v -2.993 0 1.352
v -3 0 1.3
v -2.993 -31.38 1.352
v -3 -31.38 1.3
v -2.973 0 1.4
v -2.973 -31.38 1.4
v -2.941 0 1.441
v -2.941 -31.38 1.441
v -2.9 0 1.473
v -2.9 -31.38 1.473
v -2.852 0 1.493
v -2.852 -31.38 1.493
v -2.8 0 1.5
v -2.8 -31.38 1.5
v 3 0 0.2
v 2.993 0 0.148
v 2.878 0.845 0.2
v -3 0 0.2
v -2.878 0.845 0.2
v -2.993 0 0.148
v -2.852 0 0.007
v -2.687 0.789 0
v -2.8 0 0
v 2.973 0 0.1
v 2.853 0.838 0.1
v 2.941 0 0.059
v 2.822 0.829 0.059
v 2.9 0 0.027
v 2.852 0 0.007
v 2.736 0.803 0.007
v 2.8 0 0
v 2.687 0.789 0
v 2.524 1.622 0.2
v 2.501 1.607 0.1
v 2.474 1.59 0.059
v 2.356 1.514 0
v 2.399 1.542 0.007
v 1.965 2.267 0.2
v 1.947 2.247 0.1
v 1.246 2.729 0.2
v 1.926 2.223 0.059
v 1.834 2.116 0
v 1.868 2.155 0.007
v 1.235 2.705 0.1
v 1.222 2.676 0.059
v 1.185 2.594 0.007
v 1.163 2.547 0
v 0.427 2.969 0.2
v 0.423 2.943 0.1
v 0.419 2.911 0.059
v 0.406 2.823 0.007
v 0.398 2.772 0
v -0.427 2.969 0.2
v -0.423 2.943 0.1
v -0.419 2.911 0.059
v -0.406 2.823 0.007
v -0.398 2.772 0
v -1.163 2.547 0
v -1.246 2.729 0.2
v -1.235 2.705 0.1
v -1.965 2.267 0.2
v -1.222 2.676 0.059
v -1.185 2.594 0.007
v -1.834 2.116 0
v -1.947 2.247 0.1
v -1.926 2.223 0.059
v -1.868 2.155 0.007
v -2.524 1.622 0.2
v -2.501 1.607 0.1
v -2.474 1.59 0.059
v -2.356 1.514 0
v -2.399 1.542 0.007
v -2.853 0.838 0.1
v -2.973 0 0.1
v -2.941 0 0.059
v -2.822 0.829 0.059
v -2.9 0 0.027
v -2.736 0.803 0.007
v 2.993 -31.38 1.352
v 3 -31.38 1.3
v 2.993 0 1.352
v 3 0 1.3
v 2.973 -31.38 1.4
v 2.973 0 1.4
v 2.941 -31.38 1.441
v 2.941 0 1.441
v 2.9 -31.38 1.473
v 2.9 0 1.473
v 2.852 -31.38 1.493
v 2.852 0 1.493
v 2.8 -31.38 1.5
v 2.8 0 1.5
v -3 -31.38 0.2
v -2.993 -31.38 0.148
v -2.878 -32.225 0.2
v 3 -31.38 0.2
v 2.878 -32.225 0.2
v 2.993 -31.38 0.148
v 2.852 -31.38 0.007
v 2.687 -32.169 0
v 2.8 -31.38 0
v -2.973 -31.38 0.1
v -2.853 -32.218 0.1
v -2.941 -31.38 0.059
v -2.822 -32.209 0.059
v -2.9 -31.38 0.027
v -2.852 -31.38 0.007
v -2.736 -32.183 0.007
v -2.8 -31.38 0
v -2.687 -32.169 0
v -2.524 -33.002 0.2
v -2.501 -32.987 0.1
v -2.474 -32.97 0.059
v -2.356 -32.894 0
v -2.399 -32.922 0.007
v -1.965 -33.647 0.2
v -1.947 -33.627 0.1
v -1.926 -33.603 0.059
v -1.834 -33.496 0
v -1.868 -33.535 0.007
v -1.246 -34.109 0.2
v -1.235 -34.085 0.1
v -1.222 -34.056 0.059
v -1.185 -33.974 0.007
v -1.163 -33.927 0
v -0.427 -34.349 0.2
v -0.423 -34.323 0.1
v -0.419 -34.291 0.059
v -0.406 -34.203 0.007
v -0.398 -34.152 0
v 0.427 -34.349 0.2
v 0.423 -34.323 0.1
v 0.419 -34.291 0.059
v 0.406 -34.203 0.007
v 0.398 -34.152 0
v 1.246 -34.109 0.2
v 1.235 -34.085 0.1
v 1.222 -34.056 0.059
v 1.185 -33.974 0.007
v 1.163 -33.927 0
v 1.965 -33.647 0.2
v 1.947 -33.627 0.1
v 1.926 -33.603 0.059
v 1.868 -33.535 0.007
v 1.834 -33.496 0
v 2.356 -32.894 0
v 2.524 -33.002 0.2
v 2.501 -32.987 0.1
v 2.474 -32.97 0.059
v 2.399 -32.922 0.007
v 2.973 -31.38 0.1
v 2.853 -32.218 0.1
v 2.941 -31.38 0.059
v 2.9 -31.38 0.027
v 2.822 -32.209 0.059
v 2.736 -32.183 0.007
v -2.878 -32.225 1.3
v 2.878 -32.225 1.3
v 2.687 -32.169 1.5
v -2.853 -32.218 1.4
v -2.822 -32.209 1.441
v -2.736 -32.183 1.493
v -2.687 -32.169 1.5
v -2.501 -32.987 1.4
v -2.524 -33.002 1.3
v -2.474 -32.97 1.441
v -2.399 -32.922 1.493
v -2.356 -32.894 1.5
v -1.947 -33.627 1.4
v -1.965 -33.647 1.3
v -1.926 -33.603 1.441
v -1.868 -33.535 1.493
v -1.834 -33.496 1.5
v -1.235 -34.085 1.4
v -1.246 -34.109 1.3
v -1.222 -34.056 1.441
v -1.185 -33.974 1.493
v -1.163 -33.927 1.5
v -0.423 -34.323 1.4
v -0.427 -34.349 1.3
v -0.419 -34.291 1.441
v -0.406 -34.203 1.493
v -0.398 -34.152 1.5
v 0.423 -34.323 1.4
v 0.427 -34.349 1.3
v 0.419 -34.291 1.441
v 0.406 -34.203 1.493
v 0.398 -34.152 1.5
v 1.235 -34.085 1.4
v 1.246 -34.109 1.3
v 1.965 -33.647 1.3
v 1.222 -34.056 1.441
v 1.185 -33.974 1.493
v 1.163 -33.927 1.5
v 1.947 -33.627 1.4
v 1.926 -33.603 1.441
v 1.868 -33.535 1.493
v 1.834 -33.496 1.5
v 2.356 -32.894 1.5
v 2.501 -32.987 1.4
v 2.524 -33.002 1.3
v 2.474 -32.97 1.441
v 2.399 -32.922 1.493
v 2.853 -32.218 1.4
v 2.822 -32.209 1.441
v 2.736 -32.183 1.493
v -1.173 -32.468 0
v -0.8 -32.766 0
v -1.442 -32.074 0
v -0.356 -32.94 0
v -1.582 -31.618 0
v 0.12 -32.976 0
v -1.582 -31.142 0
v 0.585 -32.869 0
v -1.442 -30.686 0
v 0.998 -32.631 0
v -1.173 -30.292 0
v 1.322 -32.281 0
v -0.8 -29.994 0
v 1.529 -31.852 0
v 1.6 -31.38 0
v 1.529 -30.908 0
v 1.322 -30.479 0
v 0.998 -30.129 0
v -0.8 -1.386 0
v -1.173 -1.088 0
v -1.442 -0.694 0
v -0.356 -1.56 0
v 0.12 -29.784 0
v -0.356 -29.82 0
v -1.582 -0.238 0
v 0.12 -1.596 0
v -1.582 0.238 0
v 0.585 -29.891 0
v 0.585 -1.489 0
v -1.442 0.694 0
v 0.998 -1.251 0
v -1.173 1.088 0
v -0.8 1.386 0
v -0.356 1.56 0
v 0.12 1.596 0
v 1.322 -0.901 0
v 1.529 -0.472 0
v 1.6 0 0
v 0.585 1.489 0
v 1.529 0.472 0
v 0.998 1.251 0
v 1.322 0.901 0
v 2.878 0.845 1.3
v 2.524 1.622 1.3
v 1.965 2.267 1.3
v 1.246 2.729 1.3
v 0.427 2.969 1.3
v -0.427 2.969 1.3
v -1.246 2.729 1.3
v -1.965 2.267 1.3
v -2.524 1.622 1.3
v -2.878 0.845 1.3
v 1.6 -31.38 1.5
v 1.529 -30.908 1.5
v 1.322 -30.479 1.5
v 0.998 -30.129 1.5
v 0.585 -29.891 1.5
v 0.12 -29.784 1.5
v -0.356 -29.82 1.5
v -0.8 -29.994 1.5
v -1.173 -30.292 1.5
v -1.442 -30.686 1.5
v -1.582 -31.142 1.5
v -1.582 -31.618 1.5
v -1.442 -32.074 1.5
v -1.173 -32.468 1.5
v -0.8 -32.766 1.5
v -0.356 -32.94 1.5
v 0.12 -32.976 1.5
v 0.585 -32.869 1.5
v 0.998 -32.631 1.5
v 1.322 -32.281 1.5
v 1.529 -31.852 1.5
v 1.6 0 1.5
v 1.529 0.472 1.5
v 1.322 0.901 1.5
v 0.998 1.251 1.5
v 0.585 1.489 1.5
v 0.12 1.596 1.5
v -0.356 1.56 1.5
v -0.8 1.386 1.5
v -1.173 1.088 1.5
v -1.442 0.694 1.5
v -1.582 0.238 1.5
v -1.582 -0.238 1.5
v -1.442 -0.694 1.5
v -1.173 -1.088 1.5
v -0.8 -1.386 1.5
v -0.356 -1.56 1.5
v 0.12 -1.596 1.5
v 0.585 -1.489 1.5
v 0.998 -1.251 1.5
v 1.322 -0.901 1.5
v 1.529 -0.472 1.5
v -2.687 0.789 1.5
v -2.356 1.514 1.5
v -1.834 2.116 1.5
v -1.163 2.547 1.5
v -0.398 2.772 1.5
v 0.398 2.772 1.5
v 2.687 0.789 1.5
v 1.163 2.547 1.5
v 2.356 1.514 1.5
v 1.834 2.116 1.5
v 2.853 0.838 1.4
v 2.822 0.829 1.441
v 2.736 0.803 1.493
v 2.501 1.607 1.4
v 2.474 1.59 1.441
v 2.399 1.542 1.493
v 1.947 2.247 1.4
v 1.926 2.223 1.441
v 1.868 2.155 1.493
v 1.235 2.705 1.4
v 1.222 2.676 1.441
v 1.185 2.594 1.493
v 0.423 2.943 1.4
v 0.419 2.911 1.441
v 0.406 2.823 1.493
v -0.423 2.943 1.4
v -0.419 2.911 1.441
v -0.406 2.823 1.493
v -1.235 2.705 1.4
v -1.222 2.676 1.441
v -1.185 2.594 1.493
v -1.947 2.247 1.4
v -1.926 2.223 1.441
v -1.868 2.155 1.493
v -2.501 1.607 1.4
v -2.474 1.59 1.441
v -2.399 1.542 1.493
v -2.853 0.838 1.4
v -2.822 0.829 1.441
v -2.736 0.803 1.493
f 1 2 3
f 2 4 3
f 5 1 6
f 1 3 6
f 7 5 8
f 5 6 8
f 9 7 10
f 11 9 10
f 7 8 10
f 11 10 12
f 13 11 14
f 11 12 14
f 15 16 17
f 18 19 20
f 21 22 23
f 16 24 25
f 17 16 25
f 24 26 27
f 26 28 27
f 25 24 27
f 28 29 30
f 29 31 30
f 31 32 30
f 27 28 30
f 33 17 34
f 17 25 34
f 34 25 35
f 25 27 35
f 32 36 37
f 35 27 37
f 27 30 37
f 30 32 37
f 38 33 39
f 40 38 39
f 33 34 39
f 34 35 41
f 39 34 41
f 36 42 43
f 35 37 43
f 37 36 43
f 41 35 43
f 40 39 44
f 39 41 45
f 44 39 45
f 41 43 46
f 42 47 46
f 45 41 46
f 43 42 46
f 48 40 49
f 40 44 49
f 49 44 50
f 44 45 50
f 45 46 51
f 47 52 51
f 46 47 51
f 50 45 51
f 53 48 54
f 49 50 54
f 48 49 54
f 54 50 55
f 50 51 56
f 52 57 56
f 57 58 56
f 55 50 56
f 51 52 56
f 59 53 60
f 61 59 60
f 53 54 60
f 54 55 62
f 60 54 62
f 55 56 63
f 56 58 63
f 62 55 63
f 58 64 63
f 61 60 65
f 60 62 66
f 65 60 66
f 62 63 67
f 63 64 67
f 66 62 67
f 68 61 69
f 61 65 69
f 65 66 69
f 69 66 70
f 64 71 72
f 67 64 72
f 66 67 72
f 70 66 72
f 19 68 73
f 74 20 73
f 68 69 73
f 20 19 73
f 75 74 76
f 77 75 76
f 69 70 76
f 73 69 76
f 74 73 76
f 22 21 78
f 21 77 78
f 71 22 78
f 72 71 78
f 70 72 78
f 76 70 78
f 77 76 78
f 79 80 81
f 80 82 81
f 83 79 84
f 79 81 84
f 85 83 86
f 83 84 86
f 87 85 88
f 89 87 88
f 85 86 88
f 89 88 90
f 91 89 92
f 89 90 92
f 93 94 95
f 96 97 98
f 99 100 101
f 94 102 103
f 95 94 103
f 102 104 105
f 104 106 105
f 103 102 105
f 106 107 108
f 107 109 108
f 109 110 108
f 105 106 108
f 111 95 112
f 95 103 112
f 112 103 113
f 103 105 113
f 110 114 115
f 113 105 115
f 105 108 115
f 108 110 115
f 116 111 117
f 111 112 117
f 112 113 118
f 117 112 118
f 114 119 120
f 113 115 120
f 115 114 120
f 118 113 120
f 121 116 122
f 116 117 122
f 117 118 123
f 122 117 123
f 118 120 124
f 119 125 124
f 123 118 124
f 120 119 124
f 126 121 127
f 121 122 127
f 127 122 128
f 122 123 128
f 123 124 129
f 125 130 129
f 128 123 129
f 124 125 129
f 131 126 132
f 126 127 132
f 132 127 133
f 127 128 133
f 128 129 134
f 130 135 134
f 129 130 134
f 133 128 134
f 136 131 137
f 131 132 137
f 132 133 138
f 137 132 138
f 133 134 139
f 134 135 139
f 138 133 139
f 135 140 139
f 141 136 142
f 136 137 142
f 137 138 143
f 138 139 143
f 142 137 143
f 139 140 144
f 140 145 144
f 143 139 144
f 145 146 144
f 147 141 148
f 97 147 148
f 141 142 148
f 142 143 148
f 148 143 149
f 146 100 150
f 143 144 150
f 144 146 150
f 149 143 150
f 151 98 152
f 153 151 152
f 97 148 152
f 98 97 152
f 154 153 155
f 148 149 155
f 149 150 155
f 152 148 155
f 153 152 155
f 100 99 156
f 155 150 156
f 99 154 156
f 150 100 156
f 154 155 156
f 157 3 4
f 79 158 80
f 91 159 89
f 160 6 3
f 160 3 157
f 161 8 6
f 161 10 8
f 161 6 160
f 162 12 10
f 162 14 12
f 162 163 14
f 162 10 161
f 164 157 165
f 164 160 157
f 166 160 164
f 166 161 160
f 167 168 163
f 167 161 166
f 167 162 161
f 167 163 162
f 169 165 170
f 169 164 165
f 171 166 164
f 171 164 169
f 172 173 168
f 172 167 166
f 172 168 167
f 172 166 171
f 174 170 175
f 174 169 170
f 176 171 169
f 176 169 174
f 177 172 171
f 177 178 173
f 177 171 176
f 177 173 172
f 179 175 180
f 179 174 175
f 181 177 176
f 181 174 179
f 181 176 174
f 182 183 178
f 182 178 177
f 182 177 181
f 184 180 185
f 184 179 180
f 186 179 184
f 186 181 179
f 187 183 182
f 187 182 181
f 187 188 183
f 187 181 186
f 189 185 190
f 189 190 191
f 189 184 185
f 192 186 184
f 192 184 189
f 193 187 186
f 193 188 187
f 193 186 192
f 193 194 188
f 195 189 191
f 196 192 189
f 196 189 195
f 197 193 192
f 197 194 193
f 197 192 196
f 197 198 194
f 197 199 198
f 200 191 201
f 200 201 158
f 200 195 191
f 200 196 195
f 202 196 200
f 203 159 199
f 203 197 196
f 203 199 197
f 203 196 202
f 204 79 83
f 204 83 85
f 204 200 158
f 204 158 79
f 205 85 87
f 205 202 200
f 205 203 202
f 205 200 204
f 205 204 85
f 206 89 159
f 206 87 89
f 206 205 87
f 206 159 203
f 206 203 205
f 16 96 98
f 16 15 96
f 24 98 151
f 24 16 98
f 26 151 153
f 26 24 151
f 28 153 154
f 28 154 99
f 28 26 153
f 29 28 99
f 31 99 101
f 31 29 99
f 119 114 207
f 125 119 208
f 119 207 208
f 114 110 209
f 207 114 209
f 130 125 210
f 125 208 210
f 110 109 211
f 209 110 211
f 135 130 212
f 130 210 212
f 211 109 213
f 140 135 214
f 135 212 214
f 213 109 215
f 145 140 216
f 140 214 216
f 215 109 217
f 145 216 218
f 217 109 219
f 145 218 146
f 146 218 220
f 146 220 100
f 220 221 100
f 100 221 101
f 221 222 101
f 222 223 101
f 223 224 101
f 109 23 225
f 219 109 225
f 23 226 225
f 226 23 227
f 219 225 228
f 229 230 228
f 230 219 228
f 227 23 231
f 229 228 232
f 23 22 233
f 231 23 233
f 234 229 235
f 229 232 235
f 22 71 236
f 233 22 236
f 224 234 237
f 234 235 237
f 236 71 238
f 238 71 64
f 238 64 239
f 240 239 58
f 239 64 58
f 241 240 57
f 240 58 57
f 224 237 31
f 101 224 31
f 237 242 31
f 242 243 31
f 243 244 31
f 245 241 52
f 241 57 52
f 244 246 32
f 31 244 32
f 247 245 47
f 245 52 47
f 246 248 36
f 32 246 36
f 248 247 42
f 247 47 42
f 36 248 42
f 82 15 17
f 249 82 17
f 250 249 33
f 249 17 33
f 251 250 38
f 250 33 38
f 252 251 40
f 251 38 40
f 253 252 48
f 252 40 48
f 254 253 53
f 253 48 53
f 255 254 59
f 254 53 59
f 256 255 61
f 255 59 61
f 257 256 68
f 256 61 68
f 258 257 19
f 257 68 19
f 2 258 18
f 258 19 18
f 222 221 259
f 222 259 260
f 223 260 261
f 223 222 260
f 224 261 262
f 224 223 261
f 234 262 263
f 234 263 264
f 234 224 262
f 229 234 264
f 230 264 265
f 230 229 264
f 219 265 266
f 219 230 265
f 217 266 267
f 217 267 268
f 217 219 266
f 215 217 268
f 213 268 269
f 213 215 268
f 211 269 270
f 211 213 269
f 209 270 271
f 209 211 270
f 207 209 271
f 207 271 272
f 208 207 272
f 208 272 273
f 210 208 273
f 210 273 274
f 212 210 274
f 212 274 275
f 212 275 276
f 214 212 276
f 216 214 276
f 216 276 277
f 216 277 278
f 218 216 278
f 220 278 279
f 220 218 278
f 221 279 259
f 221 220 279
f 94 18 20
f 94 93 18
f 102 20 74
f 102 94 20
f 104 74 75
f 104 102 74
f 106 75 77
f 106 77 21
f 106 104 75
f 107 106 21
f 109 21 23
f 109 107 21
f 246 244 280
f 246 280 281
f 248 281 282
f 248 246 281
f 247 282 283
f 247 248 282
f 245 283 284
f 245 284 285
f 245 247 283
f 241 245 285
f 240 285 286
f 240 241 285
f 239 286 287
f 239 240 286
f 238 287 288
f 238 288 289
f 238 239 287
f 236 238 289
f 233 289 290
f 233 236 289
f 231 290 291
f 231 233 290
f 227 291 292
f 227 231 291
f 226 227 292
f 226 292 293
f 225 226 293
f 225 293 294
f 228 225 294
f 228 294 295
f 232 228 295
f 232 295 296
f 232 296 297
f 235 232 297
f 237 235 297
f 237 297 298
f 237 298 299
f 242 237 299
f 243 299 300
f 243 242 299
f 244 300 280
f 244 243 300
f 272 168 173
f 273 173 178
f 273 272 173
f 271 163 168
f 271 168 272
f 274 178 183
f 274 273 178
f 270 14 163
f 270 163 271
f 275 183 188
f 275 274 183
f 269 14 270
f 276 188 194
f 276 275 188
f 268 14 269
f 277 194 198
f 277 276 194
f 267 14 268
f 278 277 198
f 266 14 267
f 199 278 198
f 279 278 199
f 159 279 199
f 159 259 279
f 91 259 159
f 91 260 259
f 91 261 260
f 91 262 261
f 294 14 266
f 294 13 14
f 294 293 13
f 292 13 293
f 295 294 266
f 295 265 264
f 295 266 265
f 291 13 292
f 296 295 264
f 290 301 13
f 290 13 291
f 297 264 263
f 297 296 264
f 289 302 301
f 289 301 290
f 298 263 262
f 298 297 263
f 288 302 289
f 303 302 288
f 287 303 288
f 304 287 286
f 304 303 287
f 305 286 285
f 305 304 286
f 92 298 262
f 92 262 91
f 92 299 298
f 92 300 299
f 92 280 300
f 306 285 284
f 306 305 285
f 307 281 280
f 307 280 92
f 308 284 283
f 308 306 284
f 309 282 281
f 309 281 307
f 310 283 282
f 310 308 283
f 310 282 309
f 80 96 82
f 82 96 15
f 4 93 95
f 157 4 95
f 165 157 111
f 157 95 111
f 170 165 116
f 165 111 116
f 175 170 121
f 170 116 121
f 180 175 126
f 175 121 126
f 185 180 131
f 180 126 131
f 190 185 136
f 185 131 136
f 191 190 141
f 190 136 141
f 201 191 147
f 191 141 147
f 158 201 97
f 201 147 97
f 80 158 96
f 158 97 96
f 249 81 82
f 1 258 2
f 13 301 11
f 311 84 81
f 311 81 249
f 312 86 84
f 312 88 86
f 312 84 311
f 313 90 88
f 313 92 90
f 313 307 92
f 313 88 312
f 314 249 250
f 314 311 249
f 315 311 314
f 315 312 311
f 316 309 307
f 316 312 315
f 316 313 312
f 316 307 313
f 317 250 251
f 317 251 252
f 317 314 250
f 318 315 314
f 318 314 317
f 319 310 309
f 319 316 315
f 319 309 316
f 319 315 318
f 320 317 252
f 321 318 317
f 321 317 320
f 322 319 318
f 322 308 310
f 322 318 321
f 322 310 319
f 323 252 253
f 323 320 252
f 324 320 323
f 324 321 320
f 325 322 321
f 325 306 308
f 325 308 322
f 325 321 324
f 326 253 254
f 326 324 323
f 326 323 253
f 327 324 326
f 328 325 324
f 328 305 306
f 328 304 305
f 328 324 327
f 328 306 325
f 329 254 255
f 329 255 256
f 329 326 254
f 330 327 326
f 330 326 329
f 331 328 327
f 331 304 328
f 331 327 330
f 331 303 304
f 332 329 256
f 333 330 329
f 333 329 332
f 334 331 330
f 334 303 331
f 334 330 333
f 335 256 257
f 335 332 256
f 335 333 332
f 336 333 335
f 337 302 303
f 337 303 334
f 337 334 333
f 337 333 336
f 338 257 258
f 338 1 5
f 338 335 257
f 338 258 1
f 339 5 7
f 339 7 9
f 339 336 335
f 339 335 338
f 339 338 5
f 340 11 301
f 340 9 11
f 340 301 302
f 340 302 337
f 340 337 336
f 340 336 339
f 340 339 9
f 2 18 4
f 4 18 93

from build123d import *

# Parameters (mm, degrees)
SKETCH1_R           = 1.6
BOSS_EXTRUDE1_DEPTH = 1.5
FILLET1_R           = 0.2


with BuildPart() as part:
    # Sketch1 → Boss-Extrude1 (new body)
    with BuildSketch(Plane.XY):
        with BuildLine():
            Line((-3, 0), (-3, -31.38))
            ThreePointArc((-3, -31.38), (0, -34.38), (3, -31.38))
            Line((3, -31.38), (3, 0))
            ThreePointArc((3, 0), (0, 3), (-3, 0))
        make_face()
        Circle(SKETCH1_R, mode=Mode.SUBTRACT)
        with Locations((0, -31.38)):
            Circle(SKETCH1_R, mode=Mode.SUBTRACT)
    extrude(amount=BOSS_EXTRUDE1_DEPTH)

    # Fillet1
    fillet1_edges = [part.edges().sort_by_distance(p)[0] for p in [
        (0, -34.38, 1.5),
        (3, -15.69, 1.5),
        (0, 3, 1.5),
        (3, -15.69, 0),
        (0, -34.38, 0),
        (-3, -15.69, 0),
        (0, 3, 0),
        (-3, -15.69, 1.5),
    ]]
    fillet(fillet1_edges, radius=FILLET1_R)


solid = part.part
